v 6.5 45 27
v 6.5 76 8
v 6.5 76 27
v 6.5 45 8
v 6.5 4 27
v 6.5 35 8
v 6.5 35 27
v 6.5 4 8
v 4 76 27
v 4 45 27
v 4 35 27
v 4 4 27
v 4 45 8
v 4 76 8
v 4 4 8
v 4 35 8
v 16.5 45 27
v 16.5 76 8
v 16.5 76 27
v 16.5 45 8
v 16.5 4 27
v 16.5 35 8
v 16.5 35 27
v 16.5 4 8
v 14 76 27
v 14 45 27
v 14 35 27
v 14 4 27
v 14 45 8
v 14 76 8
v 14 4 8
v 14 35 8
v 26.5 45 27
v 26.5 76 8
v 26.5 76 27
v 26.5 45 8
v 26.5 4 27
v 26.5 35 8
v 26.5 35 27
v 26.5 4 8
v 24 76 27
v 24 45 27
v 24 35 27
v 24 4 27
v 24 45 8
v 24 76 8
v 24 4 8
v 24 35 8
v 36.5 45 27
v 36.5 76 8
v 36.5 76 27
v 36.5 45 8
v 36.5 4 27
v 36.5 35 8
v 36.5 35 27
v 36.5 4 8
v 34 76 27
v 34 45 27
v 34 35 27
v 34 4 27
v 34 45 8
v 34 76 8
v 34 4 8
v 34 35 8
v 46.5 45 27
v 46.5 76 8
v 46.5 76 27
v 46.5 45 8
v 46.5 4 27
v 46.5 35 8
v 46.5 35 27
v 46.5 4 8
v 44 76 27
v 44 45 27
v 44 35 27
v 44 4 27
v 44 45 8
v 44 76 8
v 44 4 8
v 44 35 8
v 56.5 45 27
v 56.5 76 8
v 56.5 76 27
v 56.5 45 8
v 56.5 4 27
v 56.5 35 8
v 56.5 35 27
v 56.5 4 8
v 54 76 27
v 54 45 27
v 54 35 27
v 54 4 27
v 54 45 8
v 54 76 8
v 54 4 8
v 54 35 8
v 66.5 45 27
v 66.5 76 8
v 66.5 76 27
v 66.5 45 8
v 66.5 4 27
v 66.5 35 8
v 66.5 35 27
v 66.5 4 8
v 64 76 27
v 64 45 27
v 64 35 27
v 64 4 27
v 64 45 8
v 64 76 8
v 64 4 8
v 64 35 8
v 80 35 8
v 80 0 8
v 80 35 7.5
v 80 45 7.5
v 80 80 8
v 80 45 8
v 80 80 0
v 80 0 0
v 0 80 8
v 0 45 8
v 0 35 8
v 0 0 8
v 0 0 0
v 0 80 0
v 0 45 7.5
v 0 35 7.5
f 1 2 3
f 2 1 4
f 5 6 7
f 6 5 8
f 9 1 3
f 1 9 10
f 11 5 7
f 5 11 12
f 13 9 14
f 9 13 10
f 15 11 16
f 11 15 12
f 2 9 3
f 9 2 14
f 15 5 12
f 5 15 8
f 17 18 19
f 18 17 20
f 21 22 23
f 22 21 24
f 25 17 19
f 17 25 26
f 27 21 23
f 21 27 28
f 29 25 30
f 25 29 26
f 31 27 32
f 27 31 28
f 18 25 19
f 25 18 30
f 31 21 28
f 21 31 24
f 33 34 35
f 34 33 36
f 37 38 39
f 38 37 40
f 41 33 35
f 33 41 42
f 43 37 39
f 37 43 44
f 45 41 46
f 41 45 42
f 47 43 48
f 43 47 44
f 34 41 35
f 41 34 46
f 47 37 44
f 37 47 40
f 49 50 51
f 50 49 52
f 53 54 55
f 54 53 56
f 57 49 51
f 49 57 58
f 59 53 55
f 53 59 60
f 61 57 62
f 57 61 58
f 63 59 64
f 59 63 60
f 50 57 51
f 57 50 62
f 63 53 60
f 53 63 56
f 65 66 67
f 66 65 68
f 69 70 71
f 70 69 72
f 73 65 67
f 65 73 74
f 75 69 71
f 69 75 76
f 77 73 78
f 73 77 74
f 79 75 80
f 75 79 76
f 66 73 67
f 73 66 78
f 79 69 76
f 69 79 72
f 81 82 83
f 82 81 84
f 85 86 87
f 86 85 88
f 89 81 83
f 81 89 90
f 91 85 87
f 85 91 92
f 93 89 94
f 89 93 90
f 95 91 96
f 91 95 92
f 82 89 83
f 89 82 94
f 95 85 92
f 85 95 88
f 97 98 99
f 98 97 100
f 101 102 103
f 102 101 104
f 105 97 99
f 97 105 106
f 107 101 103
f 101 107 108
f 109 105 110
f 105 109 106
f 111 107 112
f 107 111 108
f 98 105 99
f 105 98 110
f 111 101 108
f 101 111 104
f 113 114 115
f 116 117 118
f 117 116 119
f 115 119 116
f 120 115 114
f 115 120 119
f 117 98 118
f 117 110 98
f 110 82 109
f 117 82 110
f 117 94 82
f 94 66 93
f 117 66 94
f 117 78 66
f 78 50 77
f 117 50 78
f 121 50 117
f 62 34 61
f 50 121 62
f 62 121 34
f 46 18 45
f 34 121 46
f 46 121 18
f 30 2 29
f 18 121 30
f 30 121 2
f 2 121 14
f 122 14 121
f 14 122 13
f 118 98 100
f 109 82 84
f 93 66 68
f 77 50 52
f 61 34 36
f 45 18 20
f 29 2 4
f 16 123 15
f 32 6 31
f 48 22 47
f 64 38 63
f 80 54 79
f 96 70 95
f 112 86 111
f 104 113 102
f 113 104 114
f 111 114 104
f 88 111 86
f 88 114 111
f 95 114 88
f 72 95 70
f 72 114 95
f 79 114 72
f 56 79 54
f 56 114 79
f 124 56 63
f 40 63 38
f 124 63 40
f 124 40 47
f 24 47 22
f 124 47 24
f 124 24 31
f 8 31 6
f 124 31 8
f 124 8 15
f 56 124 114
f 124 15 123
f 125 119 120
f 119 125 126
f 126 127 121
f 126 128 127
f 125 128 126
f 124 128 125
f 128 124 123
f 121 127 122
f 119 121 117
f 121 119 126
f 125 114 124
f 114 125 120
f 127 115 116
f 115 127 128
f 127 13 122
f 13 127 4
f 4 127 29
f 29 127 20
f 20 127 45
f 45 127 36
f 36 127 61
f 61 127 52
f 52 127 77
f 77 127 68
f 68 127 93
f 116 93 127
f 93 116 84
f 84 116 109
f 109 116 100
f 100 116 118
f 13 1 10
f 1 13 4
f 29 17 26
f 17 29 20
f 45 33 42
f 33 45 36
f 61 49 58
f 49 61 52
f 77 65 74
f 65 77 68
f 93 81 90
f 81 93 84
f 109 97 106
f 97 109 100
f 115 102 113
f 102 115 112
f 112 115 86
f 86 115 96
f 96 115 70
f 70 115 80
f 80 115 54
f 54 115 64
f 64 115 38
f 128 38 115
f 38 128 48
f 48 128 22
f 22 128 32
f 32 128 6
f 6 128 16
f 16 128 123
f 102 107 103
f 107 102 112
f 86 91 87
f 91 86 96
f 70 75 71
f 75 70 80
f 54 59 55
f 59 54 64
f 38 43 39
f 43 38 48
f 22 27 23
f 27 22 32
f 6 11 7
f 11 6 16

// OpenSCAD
$fn = 32;

// ----------------------------------------------------------------------
// Heatsink: slotted fin block
// ----------------------------------------------------------------------

// --- parameters (mm) ---
base_l = 80;              // base length, X
base_w = 80;              // base width, Y
base_t = 8;               // base plate thickness
fin_h = 20;               // fin height above the base
fin_t = 2.5;              // fin thickness
edge = 4;                 // margin from the base ends
pitch = 10;               // fin pitch
slot_w = 10;              // central slot width, Y

n_fins = floor((base_l - 2 * edge - fin_t) / pitch) + 1;  // fin count
total_h = base_t + fin_h - 1;  // overall height

difference() {
union() {
  cube([base_l, base_w, base_t]);
  for (i = [0 : n_fins - 1])
    translate([edge + i * pitch, edge, base_t - 1])
      cube([fin_t, base_w - 2 * edge, fin_h]);
}
  translate([-1, base_w / 2 - slot_w / 2, base_t - 0.5])
    cube([base_l + 2, slot_w, fin_h + 2]);
}
